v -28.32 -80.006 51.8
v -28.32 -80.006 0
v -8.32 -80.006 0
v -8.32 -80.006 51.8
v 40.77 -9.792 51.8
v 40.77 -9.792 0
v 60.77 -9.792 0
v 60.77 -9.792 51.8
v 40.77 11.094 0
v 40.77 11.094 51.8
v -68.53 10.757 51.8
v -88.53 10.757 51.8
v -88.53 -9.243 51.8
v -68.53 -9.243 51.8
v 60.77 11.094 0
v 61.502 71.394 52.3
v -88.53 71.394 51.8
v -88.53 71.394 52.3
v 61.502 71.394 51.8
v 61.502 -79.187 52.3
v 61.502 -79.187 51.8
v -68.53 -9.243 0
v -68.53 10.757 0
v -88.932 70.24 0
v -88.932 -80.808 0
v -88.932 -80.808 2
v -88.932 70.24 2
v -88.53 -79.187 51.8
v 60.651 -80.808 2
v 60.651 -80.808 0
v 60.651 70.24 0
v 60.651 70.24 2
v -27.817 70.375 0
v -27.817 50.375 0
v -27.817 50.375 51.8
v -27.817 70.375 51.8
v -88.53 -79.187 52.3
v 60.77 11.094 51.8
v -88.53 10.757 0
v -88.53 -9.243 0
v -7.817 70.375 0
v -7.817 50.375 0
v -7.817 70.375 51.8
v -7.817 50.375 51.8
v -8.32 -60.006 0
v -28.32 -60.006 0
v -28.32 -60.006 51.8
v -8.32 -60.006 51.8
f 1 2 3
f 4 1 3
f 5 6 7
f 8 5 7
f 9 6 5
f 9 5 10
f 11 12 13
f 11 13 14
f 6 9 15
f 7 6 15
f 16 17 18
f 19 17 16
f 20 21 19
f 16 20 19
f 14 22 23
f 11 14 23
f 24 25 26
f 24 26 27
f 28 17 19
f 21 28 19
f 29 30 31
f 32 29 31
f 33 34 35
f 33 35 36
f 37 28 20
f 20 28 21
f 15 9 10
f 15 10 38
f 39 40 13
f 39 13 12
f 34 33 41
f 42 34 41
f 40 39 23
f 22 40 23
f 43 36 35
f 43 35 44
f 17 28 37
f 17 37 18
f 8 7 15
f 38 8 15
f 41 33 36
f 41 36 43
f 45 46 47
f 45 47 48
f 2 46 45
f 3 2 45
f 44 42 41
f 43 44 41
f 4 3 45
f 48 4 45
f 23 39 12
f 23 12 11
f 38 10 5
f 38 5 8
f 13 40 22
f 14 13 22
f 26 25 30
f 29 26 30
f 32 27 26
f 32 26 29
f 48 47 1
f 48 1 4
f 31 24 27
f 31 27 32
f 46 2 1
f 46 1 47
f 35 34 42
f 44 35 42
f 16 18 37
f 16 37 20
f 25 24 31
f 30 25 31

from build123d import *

# Parameters (mm, degrees)
F1_W     = 20
F1_H     = 20
F1_H_2   = 20.88598
F2_DEPTH = 51.8
F3_W     = 150.032103
F3_H     = 150.581211
F4_DEPTH = 0.5
F5_W     = 149.583716
F5_H     = 151.047349
F6_DEPTH = 2


with BuildPart() as f2:
    # F1 (on face) → F2 (new body)
    with BuildSketch(Plane.XY):
        with Locations((-17.817096, 60.374835)):
            Rectangle(F1_W, F1_H)
        with Locations((-78.530075, 0.75702)):
            Rectangle(F1_W, F1_H)
        with Locations((-18.319978, -70.006137)):
            Rectangle(F1_W, F1_H)
        with Locations((50.769648, 0.650901)):
            Rectangle(F1_W, F1_H_2)
    extrude(amount=F2_DEPTH)


with BuildPart() as f4:
    # F3 (on face) → F4 (new body)
    with BuildSketch(Plane.XY.offset(51.8)):
        with Locations((-13.514024, -3.896855)):
            Rectangle(F3_W, F3_H)
    extrude(amount=F4_DEPTH)


with BuildPart() as f6:
    # F5 (on face) → F6 (new body)
    with BuildSketch(Plane.XY):
        with Locations((-14.140634, -5.283974)):
            Rectangle(F5_W, F5_H)
    extrude(amount=F6_DEPTH)


solid = Compound([f2.part, f4.part, f6.part])
